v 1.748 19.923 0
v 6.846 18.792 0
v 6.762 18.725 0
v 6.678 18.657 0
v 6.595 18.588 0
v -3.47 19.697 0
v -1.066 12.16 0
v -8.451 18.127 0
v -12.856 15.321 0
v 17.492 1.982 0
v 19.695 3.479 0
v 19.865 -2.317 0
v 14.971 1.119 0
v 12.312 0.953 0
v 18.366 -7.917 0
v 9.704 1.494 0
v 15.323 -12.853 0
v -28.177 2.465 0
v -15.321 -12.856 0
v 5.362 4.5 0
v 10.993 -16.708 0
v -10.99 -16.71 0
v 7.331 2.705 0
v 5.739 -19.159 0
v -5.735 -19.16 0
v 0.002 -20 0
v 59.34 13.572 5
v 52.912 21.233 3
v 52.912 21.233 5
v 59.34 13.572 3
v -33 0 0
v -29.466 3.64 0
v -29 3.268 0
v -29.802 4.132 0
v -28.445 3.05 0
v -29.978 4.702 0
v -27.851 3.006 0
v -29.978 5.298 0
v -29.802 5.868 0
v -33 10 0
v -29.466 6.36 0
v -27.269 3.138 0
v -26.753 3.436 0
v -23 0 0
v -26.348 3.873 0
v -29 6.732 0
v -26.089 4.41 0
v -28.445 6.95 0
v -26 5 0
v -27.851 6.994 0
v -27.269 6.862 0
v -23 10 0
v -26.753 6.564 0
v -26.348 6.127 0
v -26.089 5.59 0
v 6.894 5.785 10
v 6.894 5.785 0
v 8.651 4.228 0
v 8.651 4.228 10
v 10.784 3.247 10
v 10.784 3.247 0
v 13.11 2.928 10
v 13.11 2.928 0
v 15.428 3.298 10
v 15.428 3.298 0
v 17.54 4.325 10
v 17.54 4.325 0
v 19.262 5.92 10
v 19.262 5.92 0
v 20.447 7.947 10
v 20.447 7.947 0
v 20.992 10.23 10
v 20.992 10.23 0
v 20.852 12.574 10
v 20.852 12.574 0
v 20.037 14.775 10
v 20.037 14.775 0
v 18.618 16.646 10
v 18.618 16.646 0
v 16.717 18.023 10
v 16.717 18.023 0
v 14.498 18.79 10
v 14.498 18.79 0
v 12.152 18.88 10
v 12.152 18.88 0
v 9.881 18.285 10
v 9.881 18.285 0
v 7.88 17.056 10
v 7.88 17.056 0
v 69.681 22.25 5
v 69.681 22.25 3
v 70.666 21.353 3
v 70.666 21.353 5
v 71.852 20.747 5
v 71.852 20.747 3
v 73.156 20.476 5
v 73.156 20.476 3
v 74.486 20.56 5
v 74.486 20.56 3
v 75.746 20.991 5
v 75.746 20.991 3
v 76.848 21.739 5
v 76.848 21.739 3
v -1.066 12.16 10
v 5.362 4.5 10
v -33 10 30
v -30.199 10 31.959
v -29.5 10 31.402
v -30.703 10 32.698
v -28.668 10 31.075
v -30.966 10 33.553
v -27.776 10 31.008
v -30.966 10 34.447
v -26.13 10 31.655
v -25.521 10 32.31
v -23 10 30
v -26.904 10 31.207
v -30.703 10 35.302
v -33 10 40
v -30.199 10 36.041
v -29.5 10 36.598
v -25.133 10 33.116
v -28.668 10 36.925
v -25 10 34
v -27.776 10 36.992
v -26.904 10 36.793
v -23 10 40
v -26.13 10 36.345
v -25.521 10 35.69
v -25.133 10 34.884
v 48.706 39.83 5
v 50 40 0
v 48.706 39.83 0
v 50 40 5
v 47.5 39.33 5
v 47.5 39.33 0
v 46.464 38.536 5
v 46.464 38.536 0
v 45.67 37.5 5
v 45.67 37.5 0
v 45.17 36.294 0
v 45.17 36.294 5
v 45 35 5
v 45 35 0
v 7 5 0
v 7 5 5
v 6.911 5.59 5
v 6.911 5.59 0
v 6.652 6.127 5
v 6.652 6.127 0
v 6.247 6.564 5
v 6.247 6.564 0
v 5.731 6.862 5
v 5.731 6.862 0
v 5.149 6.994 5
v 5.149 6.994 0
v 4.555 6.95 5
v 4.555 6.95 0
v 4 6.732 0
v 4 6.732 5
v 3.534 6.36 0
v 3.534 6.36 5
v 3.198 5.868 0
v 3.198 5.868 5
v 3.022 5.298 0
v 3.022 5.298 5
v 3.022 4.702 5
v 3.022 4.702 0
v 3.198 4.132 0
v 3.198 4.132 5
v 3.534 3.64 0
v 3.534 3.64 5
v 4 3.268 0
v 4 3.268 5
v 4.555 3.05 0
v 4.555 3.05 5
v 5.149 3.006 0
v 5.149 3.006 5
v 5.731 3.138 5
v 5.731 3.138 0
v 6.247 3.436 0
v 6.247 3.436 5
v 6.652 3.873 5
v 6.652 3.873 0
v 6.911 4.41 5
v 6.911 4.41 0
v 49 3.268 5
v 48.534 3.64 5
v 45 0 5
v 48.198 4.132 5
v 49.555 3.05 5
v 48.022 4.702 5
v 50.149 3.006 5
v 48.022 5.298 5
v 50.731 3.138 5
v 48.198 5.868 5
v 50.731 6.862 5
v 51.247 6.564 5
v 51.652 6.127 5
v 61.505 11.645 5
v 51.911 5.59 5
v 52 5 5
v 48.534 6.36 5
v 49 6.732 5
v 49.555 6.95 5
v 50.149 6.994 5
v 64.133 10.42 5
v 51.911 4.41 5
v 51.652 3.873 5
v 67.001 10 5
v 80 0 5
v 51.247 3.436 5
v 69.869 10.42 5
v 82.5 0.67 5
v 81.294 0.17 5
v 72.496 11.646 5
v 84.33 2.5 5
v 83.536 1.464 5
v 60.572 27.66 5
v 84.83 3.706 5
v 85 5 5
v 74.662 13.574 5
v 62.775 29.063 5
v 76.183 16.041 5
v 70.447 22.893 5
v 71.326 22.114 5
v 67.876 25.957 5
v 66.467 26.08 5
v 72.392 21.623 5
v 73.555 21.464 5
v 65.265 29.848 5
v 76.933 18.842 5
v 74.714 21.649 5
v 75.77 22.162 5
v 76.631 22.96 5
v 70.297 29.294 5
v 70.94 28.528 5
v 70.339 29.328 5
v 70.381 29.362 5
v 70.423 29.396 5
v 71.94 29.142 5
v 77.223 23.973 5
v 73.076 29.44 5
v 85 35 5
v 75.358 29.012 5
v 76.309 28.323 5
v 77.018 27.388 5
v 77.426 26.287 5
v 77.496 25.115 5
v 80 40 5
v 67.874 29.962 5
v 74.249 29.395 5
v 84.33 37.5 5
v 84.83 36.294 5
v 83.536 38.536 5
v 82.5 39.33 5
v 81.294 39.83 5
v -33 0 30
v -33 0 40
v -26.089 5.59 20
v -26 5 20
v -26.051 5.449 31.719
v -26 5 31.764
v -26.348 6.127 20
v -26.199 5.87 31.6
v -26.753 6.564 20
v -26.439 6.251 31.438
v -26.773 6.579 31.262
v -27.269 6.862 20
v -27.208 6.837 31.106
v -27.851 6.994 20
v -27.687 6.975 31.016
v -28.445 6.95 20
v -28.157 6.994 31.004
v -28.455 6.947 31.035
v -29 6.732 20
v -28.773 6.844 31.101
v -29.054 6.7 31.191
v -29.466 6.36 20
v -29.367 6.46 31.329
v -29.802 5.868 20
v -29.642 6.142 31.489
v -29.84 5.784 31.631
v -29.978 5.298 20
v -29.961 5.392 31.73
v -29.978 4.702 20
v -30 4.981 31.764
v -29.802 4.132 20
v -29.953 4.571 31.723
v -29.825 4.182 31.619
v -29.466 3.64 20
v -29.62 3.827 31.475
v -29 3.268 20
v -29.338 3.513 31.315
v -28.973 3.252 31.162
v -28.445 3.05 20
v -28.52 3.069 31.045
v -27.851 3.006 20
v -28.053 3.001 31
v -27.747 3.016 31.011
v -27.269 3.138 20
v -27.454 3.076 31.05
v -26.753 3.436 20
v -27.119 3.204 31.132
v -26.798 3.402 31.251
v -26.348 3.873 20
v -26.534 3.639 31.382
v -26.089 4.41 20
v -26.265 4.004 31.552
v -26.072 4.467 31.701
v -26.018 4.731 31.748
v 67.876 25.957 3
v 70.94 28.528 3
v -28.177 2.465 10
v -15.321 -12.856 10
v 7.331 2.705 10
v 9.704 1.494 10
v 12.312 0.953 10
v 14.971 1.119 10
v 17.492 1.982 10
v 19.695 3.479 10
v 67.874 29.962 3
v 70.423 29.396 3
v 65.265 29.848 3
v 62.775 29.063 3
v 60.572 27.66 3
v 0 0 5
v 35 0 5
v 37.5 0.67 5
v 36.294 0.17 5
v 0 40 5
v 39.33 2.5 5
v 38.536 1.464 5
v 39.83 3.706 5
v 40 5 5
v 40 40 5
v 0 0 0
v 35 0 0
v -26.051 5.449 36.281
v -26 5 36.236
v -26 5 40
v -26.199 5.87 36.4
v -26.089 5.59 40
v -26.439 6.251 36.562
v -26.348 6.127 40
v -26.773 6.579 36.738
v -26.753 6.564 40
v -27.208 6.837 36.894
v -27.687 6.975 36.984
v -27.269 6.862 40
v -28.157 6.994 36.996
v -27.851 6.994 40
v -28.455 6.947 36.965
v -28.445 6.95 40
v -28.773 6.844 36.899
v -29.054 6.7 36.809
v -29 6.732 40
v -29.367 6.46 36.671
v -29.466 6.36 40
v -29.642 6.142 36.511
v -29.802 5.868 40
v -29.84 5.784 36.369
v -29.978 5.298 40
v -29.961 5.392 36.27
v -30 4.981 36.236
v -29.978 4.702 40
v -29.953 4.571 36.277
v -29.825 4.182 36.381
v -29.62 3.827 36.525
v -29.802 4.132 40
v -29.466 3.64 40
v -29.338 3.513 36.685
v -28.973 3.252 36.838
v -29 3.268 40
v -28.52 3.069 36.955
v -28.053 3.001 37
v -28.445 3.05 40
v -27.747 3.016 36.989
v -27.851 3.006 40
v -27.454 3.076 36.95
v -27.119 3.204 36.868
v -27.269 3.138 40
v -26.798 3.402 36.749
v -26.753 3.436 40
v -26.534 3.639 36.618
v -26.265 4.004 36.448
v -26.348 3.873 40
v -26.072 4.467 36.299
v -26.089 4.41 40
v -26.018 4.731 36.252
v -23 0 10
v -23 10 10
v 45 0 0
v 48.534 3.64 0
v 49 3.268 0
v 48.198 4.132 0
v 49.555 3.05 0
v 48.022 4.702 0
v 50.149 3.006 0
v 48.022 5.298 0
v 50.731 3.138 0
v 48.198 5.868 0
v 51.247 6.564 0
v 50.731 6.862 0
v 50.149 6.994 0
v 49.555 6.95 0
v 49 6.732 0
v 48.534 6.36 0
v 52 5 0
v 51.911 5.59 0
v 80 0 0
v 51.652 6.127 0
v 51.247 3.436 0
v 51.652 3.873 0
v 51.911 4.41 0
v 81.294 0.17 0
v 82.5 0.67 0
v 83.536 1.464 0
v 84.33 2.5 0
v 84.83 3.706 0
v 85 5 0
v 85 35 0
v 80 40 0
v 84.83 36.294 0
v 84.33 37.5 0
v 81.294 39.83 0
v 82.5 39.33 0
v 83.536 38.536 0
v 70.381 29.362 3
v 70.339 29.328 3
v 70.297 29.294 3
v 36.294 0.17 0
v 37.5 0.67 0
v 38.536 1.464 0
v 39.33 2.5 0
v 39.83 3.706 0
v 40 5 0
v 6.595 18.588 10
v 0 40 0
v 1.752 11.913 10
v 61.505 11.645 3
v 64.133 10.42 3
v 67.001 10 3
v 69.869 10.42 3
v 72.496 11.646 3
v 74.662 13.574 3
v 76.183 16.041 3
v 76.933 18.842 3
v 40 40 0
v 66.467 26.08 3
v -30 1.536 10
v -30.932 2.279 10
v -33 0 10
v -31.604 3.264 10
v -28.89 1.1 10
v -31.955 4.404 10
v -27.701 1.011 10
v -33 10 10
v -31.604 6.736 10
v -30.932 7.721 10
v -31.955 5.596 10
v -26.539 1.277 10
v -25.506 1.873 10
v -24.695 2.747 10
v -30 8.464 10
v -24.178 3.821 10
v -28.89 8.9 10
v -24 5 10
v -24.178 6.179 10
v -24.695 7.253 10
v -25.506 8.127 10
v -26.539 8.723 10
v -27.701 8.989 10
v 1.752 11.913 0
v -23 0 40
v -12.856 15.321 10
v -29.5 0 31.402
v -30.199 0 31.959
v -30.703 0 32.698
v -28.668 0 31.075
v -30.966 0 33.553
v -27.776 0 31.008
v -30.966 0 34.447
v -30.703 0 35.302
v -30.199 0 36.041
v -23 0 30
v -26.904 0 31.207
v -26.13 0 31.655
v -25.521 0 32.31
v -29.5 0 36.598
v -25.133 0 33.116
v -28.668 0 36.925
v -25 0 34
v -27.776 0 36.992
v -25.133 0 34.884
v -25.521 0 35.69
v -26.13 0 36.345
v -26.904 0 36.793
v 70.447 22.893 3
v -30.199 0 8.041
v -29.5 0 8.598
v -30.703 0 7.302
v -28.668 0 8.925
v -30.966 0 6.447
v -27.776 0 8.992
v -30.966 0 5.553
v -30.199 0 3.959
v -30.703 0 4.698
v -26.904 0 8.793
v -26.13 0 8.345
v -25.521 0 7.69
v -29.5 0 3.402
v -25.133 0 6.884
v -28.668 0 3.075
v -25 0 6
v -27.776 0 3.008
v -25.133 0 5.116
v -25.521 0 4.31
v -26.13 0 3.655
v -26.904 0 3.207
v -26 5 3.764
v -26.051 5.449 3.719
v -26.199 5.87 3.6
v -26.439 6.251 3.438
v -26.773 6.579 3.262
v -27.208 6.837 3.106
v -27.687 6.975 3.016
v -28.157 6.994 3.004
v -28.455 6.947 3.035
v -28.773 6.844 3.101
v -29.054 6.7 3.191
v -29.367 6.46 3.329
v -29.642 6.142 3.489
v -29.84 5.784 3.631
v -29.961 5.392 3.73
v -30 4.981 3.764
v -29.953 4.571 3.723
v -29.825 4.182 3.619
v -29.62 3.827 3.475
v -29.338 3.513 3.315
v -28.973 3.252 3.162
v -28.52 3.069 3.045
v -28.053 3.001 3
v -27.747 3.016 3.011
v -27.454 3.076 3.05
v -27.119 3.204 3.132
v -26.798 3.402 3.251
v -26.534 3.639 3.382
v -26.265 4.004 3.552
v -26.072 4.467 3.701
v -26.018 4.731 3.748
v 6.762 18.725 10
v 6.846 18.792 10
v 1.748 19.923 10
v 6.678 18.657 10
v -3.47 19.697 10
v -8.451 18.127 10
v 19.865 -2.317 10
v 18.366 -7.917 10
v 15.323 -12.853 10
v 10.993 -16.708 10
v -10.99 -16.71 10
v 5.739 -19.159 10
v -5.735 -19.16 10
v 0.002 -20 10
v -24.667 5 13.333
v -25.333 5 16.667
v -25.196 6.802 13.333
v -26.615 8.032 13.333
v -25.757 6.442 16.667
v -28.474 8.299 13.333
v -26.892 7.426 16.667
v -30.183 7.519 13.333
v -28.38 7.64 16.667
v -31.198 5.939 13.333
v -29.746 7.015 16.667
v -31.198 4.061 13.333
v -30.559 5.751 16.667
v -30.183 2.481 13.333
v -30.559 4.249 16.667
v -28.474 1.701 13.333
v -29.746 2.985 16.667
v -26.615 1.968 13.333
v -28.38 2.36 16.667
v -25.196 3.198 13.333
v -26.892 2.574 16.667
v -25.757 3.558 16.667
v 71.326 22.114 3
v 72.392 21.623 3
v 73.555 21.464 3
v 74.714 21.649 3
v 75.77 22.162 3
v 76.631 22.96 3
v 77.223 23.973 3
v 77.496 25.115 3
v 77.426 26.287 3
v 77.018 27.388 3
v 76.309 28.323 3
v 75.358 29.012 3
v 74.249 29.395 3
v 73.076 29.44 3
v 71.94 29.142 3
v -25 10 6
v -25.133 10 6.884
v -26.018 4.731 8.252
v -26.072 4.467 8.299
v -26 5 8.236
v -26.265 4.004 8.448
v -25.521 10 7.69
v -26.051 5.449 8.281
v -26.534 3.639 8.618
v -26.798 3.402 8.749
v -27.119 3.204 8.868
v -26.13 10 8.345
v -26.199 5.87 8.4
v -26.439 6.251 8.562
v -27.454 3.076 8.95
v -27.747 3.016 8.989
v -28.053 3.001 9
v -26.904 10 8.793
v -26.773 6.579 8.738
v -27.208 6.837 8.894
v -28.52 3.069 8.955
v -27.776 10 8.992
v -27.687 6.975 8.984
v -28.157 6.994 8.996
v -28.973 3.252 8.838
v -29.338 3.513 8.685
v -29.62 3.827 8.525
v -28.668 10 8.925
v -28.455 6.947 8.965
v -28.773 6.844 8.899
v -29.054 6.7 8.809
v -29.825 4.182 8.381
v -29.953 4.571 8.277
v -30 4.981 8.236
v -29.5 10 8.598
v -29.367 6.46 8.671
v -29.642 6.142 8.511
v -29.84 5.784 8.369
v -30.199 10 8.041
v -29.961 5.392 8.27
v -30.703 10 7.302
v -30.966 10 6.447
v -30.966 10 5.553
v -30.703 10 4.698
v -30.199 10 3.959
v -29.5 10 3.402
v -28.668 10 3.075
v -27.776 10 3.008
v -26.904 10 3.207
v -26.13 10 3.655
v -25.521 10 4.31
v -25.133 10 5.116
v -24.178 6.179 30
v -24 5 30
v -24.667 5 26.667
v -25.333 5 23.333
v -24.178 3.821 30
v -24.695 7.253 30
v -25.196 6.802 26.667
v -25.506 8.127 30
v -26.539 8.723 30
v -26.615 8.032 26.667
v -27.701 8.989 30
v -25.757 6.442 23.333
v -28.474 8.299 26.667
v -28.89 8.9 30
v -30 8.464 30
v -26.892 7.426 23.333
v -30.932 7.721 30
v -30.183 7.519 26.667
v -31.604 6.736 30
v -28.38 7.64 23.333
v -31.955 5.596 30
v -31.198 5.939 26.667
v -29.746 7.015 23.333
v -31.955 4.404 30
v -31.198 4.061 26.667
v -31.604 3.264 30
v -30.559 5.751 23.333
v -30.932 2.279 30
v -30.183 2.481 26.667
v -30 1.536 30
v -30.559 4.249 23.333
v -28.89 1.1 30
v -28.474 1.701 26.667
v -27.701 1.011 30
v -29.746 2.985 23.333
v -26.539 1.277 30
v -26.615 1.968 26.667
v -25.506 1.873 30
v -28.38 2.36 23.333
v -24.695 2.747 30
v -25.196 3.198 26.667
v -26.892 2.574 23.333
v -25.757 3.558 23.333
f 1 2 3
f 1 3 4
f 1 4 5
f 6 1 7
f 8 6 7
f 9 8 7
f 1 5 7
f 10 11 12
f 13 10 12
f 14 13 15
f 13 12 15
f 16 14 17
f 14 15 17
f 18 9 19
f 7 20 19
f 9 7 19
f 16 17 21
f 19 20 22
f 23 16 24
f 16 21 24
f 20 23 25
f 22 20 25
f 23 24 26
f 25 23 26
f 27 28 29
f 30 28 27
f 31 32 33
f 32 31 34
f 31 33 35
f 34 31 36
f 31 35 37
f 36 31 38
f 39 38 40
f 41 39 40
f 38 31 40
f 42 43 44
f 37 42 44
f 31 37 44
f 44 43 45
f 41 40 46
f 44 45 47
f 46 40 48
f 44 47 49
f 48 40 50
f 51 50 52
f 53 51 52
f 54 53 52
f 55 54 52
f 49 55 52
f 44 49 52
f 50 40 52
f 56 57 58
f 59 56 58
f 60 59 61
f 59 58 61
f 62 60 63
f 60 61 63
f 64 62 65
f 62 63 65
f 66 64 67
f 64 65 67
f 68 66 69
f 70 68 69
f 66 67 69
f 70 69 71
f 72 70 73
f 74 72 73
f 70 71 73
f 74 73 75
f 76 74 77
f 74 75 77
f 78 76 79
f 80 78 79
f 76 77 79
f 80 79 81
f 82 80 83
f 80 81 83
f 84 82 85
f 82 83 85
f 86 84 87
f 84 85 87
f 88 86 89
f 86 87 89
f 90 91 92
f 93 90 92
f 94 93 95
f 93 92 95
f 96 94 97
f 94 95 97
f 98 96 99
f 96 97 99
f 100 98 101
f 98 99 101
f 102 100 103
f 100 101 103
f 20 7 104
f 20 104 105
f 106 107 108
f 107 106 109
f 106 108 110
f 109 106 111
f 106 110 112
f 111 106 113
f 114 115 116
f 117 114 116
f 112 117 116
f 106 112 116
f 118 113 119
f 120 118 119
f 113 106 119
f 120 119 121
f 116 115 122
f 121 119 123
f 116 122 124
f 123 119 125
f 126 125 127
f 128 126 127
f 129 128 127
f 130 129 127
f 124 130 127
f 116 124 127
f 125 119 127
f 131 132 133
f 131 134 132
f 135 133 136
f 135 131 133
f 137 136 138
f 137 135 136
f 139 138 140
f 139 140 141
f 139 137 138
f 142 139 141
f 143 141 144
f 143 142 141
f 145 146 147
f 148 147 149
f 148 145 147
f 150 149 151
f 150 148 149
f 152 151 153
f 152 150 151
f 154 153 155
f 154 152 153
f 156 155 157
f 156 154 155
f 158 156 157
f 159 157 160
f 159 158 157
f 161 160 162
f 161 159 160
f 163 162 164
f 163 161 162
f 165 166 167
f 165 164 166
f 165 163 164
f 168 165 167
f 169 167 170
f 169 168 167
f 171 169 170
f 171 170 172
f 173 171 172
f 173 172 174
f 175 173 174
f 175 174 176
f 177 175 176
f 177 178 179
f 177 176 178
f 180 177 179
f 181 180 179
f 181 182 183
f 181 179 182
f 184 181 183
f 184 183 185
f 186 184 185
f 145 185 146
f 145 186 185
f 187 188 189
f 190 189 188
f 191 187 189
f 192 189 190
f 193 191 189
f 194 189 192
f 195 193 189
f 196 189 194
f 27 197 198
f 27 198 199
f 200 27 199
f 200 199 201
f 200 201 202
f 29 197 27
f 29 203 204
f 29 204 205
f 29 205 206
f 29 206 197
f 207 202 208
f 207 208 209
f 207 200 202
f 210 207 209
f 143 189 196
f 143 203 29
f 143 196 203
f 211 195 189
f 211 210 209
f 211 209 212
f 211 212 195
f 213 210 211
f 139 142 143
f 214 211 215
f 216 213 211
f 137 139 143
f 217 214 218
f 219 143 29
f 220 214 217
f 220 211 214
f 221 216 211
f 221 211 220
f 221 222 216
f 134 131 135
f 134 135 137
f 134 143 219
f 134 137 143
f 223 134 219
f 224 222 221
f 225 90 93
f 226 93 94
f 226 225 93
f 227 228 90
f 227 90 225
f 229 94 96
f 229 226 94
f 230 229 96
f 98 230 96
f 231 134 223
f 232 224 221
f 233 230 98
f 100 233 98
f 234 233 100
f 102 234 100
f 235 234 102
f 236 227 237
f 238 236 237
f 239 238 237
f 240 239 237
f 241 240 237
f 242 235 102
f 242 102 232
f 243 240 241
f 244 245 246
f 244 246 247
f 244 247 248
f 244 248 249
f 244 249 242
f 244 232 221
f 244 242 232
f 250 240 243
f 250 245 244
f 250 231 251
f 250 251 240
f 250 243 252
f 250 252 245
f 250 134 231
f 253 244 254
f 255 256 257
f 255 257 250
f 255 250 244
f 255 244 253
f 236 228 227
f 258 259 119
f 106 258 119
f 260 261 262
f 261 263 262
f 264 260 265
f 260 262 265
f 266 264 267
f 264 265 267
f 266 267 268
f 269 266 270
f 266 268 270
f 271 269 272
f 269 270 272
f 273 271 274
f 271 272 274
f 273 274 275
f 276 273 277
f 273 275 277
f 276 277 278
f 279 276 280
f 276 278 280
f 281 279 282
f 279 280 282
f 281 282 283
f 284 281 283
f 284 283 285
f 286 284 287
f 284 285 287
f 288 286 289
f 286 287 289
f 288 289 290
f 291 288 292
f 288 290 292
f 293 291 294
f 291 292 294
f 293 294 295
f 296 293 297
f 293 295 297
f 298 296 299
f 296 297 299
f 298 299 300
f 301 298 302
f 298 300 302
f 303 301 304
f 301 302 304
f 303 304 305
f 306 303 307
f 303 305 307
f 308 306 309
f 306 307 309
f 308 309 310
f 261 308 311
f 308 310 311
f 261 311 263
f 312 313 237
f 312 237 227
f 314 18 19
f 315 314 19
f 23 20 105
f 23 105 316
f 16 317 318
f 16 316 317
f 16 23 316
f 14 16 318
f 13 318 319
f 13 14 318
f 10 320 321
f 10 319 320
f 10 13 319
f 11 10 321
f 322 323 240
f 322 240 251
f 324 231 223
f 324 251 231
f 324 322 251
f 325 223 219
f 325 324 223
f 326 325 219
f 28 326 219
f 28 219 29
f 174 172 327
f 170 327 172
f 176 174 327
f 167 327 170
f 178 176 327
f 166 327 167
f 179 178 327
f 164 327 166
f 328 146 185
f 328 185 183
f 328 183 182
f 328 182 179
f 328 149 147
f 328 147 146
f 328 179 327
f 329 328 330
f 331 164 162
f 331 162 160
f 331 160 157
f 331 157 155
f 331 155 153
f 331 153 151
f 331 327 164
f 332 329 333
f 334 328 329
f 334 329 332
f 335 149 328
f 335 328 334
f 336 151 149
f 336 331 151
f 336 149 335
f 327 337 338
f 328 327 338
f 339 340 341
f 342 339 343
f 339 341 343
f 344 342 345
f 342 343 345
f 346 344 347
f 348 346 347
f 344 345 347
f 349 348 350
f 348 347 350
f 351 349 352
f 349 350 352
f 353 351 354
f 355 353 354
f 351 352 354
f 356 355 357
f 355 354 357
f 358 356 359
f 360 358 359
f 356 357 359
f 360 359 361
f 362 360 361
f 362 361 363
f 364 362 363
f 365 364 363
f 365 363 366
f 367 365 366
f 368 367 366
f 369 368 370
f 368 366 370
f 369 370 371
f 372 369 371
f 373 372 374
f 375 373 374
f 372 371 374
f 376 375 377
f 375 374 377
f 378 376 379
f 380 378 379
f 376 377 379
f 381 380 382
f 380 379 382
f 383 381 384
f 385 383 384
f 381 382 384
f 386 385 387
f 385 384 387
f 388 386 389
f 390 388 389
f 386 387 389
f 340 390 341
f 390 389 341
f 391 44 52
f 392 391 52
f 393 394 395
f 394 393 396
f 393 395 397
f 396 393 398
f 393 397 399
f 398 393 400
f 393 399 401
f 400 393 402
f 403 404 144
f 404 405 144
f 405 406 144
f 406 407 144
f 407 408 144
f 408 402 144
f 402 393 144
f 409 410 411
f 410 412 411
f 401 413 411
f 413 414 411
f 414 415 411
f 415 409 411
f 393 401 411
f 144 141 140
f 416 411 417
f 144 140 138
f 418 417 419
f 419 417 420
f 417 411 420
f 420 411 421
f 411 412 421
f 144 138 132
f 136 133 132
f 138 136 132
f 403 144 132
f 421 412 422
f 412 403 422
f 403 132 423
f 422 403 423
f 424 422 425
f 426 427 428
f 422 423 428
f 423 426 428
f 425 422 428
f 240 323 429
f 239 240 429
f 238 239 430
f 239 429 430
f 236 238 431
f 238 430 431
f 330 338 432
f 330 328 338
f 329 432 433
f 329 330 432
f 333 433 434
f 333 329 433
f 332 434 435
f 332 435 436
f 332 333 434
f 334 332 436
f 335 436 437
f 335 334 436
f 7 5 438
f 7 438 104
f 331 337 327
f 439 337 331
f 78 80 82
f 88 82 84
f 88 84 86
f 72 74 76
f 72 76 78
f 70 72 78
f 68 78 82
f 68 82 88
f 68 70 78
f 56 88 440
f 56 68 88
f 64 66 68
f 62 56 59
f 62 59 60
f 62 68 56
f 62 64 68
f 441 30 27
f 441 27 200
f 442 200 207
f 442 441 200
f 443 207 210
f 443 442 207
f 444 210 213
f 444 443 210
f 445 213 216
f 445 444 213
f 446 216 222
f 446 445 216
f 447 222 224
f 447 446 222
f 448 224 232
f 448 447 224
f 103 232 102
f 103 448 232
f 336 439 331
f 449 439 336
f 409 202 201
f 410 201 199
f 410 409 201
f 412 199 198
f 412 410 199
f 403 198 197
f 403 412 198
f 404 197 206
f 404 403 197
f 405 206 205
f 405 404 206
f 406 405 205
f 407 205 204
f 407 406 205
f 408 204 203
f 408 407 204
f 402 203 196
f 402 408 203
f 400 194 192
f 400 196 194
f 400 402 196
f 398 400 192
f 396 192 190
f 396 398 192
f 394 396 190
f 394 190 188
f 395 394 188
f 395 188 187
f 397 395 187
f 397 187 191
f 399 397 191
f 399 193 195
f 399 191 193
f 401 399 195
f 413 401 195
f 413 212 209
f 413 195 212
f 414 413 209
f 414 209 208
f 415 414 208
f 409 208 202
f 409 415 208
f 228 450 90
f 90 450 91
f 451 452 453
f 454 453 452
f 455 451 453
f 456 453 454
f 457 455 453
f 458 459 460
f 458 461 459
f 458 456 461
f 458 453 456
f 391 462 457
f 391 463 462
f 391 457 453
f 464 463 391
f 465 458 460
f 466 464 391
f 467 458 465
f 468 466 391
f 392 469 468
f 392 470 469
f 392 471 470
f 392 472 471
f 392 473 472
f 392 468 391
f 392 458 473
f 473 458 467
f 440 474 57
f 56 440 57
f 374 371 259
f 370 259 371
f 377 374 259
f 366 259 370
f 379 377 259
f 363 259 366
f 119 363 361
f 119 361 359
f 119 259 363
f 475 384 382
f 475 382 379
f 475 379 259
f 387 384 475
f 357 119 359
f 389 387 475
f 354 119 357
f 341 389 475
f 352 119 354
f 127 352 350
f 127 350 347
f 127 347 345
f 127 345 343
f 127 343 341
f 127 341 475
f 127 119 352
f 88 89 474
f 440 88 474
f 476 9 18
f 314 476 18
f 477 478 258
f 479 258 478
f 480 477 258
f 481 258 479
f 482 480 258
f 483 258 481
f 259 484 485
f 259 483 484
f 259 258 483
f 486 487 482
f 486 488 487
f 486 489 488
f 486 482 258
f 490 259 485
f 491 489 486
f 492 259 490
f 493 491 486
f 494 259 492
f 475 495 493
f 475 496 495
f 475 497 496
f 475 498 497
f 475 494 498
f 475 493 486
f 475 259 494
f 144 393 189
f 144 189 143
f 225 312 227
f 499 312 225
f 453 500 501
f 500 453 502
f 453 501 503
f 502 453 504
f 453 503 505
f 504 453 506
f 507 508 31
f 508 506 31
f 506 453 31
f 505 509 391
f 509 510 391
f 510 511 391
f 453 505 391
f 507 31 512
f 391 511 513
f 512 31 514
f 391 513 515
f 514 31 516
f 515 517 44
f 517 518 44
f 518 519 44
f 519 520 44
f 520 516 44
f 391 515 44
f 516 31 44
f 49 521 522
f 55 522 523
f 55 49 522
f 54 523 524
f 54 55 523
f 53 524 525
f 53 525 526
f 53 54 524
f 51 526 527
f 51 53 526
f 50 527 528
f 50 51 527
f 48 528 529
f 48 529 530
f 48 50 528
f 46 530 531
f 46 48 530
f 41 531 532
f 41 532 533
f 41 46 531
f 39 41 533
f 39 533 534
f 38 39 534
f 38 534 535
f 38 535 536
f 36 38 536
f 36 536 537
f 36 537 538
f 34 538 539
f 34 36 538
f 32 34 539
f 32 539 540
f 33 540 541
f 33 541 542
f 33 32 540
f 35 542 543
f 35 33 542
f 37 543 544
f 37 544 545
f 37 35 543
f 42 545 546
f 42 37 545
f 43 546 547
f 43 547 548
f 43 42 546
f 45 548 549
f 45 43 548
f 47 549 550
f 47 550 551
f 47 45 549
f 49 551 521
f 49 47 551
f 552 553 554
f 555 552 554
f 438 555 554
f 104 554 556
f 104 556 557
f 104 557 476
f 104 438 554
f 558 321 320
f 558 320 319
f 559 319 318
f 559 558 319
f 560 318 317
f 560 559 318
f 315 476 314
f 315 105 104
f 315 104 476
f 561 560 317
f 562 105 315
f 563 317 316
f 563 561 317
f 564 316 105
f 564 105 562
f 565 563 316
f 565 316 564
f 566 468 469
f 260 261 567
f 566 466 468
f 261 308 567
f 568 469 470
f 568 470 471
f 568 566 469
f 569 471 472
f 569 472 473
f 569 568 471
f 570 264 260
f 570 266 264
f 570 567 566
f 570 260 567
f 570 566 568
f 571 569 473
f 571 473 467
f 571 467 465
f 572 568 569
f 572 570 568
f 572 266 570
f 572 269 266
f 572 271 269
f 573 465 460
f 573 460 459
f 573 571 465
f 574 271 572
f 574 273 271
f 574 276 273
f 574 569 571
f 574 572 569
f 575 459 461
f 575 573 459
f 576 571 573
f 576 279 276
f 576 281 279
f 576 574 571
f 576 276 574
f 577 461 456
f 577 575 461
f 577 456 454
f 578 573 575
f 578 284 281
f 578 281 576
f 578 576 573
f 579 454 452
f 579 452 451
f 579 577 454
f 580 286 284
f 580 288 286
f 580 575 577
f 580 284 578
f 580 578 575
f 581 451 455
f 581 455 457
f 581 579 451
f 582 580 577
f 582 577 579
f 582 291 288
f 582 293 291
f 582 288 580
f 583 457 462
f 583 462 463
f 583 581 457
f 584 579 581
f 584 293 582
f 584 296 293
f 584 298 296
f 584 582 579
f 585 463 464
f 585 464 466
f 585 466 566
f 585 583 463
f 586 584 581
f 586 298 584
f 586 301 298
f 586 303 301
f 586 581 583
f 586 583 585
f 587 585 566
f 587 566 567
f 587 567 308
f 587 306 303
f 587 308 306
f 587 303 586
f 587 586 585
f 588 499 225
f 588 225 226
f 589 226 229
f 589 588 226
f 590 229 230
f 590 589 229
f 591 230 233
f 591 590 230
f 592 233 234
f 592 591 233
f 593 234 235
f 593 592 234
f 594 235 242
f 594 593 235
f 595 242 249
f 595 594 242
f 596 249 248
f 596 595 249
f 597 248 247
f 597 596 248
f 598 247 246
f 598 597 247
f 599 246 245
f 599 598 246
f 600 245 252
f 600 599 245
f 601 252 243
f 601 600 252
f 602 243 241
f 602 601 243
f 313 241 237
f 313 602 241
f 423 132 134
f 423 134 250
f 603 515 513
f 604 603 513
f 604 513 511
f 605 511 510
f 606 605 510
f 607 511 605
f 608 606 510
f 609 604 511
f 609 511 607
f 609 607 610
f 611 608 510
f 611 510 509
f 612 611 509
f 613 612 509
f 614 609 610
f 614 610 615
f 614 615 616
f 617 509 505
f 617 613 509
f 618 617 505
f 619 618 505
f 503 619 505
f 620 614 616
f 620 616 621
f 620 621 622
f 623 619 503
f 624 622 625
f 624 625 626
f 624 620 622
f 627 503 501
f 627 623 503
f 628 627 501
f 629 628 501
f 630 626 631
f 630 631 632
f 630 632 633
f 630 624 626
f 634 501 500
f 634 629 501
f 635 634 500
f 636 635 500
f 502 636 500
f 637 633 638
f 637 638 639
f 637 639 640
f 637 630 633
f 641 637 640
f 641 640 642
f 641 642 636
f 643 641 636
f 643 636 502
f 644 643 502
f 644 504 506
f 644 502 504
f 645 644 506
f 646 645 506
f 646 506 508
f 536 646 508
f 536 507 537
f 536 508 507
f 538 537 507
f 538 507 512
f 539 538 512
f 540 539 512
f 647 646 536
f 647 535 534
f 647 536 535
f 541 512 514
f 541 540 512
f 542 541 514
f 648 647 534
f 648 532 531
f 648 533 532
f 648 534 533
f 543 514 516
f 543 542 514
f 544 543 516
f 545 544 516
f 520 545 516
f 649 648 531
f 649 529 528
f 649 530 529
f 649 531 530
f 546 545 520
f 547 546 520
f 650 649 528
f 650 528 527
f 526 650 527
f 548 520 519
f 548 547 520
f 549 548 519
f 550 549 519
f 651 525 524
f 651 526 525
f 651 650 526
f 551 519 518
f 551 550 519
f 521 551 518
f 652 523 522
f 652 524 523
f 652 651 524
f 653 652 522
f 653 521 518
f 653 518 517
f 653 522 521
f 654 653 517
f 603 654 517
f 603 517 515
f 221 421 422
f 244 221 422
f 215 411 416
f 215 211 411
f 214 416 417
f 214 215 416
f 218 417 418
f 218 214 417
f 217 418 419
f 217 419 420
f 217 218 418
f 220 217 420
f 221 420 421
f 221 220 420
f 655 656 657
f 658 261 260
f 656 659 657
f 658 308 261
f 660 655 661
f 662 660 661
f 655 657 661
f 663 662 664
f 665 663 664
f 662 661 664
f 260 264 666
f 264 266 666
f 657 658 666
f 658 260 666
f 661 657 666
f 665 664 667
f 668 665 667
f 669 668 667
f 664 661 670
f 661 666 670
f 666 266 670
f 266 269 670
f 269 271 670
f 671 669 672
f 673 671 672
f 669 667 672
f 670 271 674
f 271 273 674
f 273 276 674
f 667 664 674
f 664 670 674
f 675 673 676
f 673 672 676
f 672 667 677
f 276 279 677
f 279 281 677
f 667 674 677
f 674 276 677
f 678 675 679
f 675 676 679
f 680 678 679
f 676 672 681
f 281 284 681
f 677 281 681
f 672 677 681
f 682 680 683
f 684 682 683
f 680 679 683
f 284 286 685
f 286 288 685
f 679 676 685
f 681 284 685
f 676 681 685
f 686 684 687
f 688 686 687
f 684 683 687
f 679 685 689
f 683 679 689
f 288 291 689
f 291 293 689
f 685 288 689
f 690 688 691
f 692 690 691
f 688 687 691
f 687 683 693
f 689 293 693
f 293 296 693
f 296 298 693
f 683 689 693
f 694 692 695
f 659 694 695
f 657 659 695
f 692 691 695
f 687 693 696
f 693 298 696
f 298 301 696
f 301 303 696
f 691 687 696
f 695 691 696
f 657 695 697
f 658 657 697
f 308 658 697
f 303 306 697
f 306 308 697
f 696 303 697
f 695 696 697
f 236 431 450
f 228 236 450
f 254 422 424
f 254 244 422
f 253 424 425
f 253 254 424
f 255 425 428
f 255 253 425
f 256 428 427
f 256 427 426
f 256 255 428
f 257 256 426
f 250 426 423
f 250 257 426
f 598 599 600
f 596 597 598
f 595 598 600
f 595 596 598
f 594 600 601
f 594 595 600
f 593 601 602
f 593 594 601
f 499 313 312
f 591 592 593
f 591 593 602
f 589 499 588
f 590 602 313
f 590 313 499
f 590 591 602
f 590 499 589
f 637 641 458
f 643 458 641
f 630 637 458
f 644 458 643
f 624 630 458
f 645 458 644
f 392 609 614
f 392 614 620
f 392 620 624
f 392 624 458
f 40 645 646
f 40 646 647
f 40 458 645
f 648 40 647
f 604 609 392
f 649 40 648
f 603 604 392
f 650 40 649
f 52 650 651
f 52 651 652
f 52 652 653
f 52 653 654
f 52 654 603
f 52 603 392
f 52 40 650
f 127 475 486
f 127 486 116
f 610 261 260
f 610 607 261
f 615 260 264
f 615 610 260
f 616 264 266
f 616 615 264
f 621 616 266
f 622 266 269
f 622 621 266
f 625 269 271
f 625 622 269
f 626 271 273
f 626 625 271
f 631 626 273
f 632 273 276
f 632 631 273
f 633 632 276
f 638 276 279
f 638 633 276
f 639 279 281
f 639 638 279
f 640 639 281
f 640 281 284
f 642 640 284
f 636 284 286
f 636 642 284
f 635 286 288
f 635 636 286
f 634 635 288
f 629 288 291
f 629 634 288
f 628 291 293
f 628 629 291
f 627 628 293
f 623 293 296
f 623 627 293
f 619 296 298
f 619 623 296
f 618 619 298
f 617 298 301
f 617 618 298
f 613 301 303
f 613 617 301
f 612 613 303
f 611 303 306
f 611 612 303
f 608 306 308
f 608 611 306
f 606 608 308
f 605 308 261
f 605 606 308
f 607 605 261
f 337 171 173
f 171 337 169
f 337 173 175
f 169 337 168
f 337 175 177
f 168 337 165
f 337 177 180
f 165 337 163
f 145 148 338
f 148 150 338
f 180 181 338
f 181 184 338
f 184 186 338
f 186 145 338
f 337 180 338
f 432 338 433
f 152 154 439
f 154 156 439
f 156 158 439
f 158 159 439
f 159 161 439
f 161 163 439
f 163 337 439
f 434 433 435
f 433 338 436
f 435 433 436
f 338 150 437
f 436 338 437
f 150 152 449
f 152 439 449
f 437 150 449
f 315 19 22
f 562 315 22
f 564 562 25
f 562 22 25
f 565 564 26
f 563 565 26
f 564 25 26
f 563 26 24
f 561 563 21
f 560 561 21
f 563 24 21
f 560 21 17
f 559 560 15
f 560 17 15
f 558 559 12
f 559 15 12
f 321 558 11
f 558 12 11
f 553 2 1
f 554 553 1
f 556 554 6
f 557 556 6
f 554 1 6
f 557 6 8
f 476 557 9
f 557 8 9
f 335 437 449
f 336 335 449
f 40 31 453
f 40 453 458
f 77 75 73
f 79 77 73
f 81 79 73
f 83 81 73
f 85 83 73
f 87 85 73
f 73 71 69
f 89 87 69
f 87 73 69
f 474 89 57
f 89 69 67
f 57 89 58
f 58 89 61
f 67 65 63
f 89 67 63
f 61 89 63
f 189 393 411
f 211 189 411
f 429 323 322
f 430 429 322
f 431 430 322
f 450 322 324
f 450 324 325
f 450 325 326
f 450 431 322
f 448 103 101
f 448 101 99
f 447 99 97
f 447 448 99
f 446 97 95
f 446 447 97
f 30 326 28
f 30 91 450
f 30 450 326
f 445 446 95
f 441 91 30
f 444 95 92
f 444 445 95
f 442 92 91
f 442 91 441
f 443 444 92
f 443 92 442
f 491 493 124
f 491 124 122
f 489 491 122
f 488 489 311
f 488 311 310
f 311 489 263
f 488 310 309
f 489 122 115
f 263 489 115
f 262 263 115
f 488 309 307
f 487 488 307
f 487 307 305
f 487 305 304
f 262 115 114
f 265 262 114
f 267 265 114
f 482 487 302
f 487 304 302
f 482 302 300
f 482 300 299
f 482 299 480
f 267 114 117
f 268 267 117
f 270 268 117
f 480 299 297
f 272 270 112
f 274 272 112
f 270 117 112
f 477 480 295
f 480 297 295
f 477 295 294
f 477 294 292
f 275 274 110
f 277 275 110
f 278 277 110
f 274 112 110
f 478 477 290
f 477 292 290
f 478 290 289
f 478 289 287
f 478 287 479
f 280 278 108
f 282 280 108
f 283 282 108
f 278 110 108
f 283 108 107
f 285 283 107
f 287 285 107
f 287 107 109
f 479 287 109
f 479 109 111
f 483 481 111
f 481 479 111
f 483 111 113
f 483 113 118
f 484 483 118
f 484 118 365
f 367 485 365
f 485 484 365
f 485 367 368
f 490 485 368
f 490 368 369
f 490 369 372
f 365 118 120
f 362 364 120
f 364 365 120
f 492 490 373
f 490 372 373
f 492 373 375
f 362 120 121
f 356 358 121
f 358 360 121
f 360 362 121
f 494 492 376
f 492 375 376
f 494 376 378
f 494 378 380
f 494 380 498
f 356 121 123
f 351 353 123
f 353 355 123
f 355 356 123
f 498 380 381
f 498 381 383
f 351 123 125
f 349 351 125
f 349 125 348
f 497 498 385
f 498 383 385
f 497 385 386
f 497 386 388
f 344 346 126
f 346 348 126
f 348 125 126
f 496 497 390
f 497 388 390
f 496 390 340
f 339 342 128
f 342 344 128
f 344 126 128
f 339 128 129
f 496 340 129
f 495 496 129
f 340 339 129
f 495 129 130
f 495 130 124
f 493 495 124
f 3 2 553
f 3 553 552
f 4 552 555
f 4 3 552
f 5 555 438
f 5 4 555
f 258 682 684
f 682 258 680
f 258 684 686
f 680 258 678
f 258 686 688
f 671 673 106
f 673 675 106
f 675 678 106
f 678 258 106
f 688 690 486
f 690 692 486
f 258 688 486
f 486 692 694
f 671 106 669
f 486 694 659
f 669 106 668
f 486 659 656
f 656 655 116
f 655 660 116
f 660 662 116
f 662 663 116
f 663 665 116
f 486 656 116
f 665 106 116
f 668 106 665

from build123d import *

# Parameters (mm, degrees)
CYLINDER003_R             = 2
CYLINDER003_DEPTH         = 22
CYLINDER002_R             = 3
CYLINDER002_DEPTH         = 100
CYLINDER002_ROLL_ANGLE    = 90
BOX001_W                  = 10
BOX001_H                  = 10
BOX001_DEPTH              = 10
CYLINDER001_R             = 2
CYLINDER001_DEPTH         = 22
CYLINDER_R                = 3
CYLINDER_DEPTH            = 100
CYLINDER_ROLL_ANGLE       = 90
BOX_W                     = 10
BOX_H                     = 10
BOX_DEPTH                 = 10
CYLINDER005_R             = 2
CYLINDER005_DEPTH         = 10
BOX004_W                  = 40
BOX004_H                  = 40
BOX004_DEPTH              = 5
FILLET003_R               = 5
BOX006_W                  = 10
BOX006_H                  = 10
BOX006_DEPTH              = 12
CYLINDER007_R             = 10
CYLINDER007_DEPTH         = 12
BOX005_W                  = 20
BOX005_H                  = 20
BOX005_DEPTH              = 10
CYLINDER006_R             = 20
CYLINDER006_DEPTH         = 10
BOX003_W                  = 8
BOX003_H                  = 8
BOX003_DEPTH              = 10
CYLINDER008_R             = 8
CYLINDER008_DEPTH         = 10
FUSION006_PLACEMENT_ANGLE = 220
CLONE_SCALE_SCALE         = 0.5
CYLINDER004_R             = 2
CYLINDER004_DEPTH         = 10
BOX002_W                  = 40
BOX002_H                  = 40
BOX002_DEPTH              = 5
FILLET_R                  = 5
FILLET001_R               = 5
FILLET002_R               = 5


with BuildPart() as cylinder003:
    # Cylinder003 → Cylinder003 (new body)
    with BuildSketch(Plane(origin=(5, 5, -1), x_dir=(1, 0, 0), z_dir=(0, 0, 1))):
        Circle(CYLINDER003_R)
    extrude(amount=CYLINDER003_DEPTH)


with BuildPart() as cone001:
    # Cone001 → Cone001 (revolve)
    with BuildSketch(Plane(origin=(5, 5, 10), x_dir=(1, 0, 0), z_dir=(0, -1, 0))):
        Polygon((0, 0), (4, 0), (2, 10), (0, 10), align=None)
    revolve(axis=Axis((5, 5, 10), (0, 0, 1)))


with BuildPart() as cylinder002:
    # Cylinder002 → Cylinder002 (new body)
    with BuildSketch(Plane.XY):
        Circle(CYLINDER002_R)
    extrude(amount=CYLINDER002_DEPTH)


with BuildPart() as cylinder002_1:
    # Cylinder002 roll: moved
    add(cylinder002.part.rotate(Axis((0, 0, 0), (1, 0, 0)), CYLINDER002_ROLL_ANGLE))


with BuildPart() as cylinder002_2:
    # Cylinder002 placement: moved
    add(cylinder002_1.part.moved(Location((5, 10, 6))))


with BuildPart() as cut003:
    # Box001 → Box001 (new body)
    with BuildSketch(Plane.XY):
        with Locations((5, 5)):
            Rectangle(BOX001_W, BOX001_H)
    extrude(amount=BOX001_DEPTH)

    # Cut002: cut Cylinder002
    add(cylinder002_2.part, mode=Mode.SUBTRACT)

    # Fusion001: union Cone001
    add(cone001.part)

    # Cut003: cut Cylinder003
    add(cylinder003.part, mode=Mode.SUBTRACT)


with BuildPart() as cut003_1:
    # Cut003 placement: moved
    add(cut003.part.moved(Location((23, 0, 0))))


with BuildPart() as part_mirroring:
    # Part__Mirroring: instance of Cut003
    add(cut003_1.part.mirror(Plane(origin=(0, 0, 0), x_dir=(0, 1, 0), z_dir=(0, 0, 1))))


with BuildPart() as part_mirroring_1:
    # Part__Mirroring placement: moved
    add(part_mirroring.part.moved(Location((-23, 0, 40))))


with BuildPart() as cylinder001:
    # Cylinder001 → Cylinder001 (new body)
    with BuildSketch(Plane(origin=(5, 5, -1), x_dir=(1, 0, 0), z_dir=(0, 0, 1))):
        Circle(CYLINDER001_R)
    extrude(amount=CYLINDER001_DEPTH)


with BuildPart() as cone:
    # Cone → Cone (revolve)
    with BuildSketch(Plane(origin=(5, 5, 10), x_dir=(1, 0, 0), z_dir=(0, -1, 0))):
        Polygon((0, 0), (4, 0), (2, 10), (0, 10), align=None)
    revolve(axis=Axis((5, 5, 10), (0, 0, 1)))


with BuildPart() as cylinder:
    # Cylinder → Cylinder (new body)
    with BuildSketch(Plane.XY):
        Circle(CYLINDER_R)
    extrude(amount=CYLINDER_DEPTH)


with BuildPart() as cylinder_1:
    # Cylinder roll: moved
    add(cylinder.part.rotate(Axis((0, 0, 0), (1, 0, 0)), CYLINDER_ROLL_ANGLE))


with BuildPart() as cylinder_2:
    # Cylinder placement: moved
    add(cylinder_1.part.moved(Location((5, 10, 6))))


with BuildPart() as fusion002:
    # Box → Box (new body)
    with BuildSketch(Plane.XY):
        with Locations((5, 5)):
            Rectangle(BOX_W, BOX_H)
    extrude(amount=BOX_DEPTH)

    # Cut: cut Cylinder
    add(cylinder_2.part, mode=Mode.SUBTRACT)

    # Fusion: union Cone
    add(cone.part)

    # Cut001: cut Cylinder001
    add(cylinder001.part, mode=Mode.SUBTRACT)

    # Fusion002: union Part__Mirroring
    add(part_mirroring_1.part)


with BuildPart() as fusion002_1:
    # Fusion002 placement: moved
    add(fusion002.part.moved(Location((-33, 0, 0))))


with BuildPart() as cylinder005:
    # Cylinder005 → Cylinder005 (new body)
    with BuildSketch(Plane(origin=(5, 5, 0), x_dir=(1, 0, 0), z_dir=(0, 0, 1))):
        Circle(CYLINDER005_R)
    extrude(amount=CYLINDER005_DEPTH)


with BuildPart() as fillet003:
    # Box004 → Box004 (new body)
    with BuildSketch(Plane.XY):
        with Locations((20, 20)):
            Rectangle(BOX004_W, BOX004_H)
    extrude(amount=BOX004_DEPTH)

    # Cut006: cut Cylinder005
    add(cylinder005.part, mode=Mode.SUBTRACT)

    # Fillet003
    fillet003_edges = [fillet003.edges().sort_by_distance(p)[0] for p in [
        (40, 0, 2.5),
    ]]
    fillet(fillet003_edges, radius=FILLET003_R)


with BuildPart() as cube006:
    # Box006 → Box006 (new body)
    with BuildSketch(Plane(origin=(0, -10, -1), x_dir=(1, 0, 0), z_dir=(0, 0, 1))):
        with Locations((5, 5)):
            Rectangle(BOX006_W, BOX006_H)
    extrude(amount=BOX006_DEPTH)


with BuildPart() as fusion004:
    # Cylinder007 → Cylinder007 (new body)
    with BuildSketch(Plane.XY.offset(-1)):
        Circle(CYLINDER007_R)
    extrude(amount=CYLINDER007_DEPTH)

    # Fusion004: union Cube006
    add(cube006.part)


with BuildPart() as fusion004_1:
    # Fusion004 placement: moved
    add(fusion004.part.moved(Location((-17, 0, 0))))


with BuildPart() as cube005:
    # Box005 → Box005 (new body)
    with BuildSketch(Plane(origin=(0, -20, 0), x_dir=(1, 0, 0), z_dir=(0, 0, 1))):
        with Locations((10, 10)):
            Rectangle(BOX005_W, BOX005_H)
    extrude(amount=BOX005_DEPTH)


with BuildPart() as cut007:
    # Cylinder006 → Cylinder006 (new body)
    with BuildSketch(Plane.XY):
        Circle(CYLINDER006_R)
    extrude(amount=CYLINDER006_DEPTH)

    # Fusion003: union Cube005
    add(cube005.part)

    # Cut007: cut Fusion004
    add(fusion004_1.part, mode=Mode.SUBTRACT)


with BuildPart() as cube003:
    # Box003 → Box003 (new body)
    with BuildSketch(Plane(origin=(0, -8, 0), x_dir=(1, 0, 0), z_dir=(0, 0, 1))):
        with Locations((4, 4)):
            Rectangle(BOX003_W, BOX003_H)
    extrude(amount=BOX003_DEPTH)


with BuildPart() as rrl_logo:
    # Cylinder008 → Cylinder008 (new body)
    with BuildSketch(Plane.XY):
        Circle(CYLINDER008_R)
    extrude(amount=CYLINDER008_DEPTH)

    # Fusion005: union Cube003
    add(cube003.part)


with BuildPart() as rrl_logo_1:
    # Fusion005 placement: moved
    add(rrl_logo.part.moved(Location((-17, 0, 0))))

    # Fusion006: union Cut007
    add(cut007.part)


with BuildPart() as rrl_logo_2:
    # Fusion006 placement: moved
    add(rrl_logo_1.part.rotate(Axis((0, 0, 0), (0, 0, 1)), FUSION006_PLACEMENT_ANGLE))


with BuildPart() as clone_of_rrl_logo:
    # Clone base: copy of rrl-logo
    add(rrl_logo_2.part)


with BuildPart() as clone_of_rrl_logo_1:
    # Clone scale: moved
    add(clone_of_rrl_logo.part.scale(CLONE_SCALE_SCALE))


with BuildPart() as clone_of_rrl_logo_2:
    # Clone placement: moved
    add(clone_of_rrl_logo_1.part.moved(Location((67, 20, 3))))


with BuildPart() as cylinder004:
    # Cylinder004 → Cylinder004 (new body)
    with BuildSketch(Plane(origin=(5, 5, 0), x_dir=(1, 0, 0), z_dir=(0, 0, 1))):
        Circle(CYLINDER004_R)
    extrude(amount=CYLINDER004_DEPTH)


with BuildPart() as cut008:
    # Box002 → Box002 (new body)
    with BuildSketch(Plane.XY):
        with Locations((20, 20)):
            Rectangle(BOX002_W, BOX002_H)
    extrude(amount=BOX002_DEPTH)

    # Cut004: cut Cylinder004
    add(cylinder004.part, mode=Mode.SUBTRACT)

    # Fillet
    fillet_edges = [cut008.edges().sort_by_distance(p)[0] for p in [
        (40, 0, 2.5),
    ]]
    fillet(fillet_edges, radius=FILLET_R)

    # Fillet001
    fillet001_edges = [cut008.edges().sort_by_distance(p)[0] for p in [
        (40, 40, 2.5),
    ]]
    fillet(fillet001_edges, radius=FILLET001_R)

    # Fillet002
    fillet002_edges = [cut008.edges().sort_by_distance(p)[0] for p in [
        (0, 40, 2.5),
    ]]
    fillet(fillet002_edges, radius=FILLET002_R)


with BuildPart() as cut008_1:
    # Fillet002 placement: moved
    add(cut008.part.moved(Location((45, 0, 0))))

    # Cut008: cut Clone of rrl-logo
    add(clone_of_rrl_logo_2.part, mode=Mode.SUBTRACT)


solid = Compound([fusion002_1.part, fillet003.part, rrl_logo_2.part, cut008_1.part])
